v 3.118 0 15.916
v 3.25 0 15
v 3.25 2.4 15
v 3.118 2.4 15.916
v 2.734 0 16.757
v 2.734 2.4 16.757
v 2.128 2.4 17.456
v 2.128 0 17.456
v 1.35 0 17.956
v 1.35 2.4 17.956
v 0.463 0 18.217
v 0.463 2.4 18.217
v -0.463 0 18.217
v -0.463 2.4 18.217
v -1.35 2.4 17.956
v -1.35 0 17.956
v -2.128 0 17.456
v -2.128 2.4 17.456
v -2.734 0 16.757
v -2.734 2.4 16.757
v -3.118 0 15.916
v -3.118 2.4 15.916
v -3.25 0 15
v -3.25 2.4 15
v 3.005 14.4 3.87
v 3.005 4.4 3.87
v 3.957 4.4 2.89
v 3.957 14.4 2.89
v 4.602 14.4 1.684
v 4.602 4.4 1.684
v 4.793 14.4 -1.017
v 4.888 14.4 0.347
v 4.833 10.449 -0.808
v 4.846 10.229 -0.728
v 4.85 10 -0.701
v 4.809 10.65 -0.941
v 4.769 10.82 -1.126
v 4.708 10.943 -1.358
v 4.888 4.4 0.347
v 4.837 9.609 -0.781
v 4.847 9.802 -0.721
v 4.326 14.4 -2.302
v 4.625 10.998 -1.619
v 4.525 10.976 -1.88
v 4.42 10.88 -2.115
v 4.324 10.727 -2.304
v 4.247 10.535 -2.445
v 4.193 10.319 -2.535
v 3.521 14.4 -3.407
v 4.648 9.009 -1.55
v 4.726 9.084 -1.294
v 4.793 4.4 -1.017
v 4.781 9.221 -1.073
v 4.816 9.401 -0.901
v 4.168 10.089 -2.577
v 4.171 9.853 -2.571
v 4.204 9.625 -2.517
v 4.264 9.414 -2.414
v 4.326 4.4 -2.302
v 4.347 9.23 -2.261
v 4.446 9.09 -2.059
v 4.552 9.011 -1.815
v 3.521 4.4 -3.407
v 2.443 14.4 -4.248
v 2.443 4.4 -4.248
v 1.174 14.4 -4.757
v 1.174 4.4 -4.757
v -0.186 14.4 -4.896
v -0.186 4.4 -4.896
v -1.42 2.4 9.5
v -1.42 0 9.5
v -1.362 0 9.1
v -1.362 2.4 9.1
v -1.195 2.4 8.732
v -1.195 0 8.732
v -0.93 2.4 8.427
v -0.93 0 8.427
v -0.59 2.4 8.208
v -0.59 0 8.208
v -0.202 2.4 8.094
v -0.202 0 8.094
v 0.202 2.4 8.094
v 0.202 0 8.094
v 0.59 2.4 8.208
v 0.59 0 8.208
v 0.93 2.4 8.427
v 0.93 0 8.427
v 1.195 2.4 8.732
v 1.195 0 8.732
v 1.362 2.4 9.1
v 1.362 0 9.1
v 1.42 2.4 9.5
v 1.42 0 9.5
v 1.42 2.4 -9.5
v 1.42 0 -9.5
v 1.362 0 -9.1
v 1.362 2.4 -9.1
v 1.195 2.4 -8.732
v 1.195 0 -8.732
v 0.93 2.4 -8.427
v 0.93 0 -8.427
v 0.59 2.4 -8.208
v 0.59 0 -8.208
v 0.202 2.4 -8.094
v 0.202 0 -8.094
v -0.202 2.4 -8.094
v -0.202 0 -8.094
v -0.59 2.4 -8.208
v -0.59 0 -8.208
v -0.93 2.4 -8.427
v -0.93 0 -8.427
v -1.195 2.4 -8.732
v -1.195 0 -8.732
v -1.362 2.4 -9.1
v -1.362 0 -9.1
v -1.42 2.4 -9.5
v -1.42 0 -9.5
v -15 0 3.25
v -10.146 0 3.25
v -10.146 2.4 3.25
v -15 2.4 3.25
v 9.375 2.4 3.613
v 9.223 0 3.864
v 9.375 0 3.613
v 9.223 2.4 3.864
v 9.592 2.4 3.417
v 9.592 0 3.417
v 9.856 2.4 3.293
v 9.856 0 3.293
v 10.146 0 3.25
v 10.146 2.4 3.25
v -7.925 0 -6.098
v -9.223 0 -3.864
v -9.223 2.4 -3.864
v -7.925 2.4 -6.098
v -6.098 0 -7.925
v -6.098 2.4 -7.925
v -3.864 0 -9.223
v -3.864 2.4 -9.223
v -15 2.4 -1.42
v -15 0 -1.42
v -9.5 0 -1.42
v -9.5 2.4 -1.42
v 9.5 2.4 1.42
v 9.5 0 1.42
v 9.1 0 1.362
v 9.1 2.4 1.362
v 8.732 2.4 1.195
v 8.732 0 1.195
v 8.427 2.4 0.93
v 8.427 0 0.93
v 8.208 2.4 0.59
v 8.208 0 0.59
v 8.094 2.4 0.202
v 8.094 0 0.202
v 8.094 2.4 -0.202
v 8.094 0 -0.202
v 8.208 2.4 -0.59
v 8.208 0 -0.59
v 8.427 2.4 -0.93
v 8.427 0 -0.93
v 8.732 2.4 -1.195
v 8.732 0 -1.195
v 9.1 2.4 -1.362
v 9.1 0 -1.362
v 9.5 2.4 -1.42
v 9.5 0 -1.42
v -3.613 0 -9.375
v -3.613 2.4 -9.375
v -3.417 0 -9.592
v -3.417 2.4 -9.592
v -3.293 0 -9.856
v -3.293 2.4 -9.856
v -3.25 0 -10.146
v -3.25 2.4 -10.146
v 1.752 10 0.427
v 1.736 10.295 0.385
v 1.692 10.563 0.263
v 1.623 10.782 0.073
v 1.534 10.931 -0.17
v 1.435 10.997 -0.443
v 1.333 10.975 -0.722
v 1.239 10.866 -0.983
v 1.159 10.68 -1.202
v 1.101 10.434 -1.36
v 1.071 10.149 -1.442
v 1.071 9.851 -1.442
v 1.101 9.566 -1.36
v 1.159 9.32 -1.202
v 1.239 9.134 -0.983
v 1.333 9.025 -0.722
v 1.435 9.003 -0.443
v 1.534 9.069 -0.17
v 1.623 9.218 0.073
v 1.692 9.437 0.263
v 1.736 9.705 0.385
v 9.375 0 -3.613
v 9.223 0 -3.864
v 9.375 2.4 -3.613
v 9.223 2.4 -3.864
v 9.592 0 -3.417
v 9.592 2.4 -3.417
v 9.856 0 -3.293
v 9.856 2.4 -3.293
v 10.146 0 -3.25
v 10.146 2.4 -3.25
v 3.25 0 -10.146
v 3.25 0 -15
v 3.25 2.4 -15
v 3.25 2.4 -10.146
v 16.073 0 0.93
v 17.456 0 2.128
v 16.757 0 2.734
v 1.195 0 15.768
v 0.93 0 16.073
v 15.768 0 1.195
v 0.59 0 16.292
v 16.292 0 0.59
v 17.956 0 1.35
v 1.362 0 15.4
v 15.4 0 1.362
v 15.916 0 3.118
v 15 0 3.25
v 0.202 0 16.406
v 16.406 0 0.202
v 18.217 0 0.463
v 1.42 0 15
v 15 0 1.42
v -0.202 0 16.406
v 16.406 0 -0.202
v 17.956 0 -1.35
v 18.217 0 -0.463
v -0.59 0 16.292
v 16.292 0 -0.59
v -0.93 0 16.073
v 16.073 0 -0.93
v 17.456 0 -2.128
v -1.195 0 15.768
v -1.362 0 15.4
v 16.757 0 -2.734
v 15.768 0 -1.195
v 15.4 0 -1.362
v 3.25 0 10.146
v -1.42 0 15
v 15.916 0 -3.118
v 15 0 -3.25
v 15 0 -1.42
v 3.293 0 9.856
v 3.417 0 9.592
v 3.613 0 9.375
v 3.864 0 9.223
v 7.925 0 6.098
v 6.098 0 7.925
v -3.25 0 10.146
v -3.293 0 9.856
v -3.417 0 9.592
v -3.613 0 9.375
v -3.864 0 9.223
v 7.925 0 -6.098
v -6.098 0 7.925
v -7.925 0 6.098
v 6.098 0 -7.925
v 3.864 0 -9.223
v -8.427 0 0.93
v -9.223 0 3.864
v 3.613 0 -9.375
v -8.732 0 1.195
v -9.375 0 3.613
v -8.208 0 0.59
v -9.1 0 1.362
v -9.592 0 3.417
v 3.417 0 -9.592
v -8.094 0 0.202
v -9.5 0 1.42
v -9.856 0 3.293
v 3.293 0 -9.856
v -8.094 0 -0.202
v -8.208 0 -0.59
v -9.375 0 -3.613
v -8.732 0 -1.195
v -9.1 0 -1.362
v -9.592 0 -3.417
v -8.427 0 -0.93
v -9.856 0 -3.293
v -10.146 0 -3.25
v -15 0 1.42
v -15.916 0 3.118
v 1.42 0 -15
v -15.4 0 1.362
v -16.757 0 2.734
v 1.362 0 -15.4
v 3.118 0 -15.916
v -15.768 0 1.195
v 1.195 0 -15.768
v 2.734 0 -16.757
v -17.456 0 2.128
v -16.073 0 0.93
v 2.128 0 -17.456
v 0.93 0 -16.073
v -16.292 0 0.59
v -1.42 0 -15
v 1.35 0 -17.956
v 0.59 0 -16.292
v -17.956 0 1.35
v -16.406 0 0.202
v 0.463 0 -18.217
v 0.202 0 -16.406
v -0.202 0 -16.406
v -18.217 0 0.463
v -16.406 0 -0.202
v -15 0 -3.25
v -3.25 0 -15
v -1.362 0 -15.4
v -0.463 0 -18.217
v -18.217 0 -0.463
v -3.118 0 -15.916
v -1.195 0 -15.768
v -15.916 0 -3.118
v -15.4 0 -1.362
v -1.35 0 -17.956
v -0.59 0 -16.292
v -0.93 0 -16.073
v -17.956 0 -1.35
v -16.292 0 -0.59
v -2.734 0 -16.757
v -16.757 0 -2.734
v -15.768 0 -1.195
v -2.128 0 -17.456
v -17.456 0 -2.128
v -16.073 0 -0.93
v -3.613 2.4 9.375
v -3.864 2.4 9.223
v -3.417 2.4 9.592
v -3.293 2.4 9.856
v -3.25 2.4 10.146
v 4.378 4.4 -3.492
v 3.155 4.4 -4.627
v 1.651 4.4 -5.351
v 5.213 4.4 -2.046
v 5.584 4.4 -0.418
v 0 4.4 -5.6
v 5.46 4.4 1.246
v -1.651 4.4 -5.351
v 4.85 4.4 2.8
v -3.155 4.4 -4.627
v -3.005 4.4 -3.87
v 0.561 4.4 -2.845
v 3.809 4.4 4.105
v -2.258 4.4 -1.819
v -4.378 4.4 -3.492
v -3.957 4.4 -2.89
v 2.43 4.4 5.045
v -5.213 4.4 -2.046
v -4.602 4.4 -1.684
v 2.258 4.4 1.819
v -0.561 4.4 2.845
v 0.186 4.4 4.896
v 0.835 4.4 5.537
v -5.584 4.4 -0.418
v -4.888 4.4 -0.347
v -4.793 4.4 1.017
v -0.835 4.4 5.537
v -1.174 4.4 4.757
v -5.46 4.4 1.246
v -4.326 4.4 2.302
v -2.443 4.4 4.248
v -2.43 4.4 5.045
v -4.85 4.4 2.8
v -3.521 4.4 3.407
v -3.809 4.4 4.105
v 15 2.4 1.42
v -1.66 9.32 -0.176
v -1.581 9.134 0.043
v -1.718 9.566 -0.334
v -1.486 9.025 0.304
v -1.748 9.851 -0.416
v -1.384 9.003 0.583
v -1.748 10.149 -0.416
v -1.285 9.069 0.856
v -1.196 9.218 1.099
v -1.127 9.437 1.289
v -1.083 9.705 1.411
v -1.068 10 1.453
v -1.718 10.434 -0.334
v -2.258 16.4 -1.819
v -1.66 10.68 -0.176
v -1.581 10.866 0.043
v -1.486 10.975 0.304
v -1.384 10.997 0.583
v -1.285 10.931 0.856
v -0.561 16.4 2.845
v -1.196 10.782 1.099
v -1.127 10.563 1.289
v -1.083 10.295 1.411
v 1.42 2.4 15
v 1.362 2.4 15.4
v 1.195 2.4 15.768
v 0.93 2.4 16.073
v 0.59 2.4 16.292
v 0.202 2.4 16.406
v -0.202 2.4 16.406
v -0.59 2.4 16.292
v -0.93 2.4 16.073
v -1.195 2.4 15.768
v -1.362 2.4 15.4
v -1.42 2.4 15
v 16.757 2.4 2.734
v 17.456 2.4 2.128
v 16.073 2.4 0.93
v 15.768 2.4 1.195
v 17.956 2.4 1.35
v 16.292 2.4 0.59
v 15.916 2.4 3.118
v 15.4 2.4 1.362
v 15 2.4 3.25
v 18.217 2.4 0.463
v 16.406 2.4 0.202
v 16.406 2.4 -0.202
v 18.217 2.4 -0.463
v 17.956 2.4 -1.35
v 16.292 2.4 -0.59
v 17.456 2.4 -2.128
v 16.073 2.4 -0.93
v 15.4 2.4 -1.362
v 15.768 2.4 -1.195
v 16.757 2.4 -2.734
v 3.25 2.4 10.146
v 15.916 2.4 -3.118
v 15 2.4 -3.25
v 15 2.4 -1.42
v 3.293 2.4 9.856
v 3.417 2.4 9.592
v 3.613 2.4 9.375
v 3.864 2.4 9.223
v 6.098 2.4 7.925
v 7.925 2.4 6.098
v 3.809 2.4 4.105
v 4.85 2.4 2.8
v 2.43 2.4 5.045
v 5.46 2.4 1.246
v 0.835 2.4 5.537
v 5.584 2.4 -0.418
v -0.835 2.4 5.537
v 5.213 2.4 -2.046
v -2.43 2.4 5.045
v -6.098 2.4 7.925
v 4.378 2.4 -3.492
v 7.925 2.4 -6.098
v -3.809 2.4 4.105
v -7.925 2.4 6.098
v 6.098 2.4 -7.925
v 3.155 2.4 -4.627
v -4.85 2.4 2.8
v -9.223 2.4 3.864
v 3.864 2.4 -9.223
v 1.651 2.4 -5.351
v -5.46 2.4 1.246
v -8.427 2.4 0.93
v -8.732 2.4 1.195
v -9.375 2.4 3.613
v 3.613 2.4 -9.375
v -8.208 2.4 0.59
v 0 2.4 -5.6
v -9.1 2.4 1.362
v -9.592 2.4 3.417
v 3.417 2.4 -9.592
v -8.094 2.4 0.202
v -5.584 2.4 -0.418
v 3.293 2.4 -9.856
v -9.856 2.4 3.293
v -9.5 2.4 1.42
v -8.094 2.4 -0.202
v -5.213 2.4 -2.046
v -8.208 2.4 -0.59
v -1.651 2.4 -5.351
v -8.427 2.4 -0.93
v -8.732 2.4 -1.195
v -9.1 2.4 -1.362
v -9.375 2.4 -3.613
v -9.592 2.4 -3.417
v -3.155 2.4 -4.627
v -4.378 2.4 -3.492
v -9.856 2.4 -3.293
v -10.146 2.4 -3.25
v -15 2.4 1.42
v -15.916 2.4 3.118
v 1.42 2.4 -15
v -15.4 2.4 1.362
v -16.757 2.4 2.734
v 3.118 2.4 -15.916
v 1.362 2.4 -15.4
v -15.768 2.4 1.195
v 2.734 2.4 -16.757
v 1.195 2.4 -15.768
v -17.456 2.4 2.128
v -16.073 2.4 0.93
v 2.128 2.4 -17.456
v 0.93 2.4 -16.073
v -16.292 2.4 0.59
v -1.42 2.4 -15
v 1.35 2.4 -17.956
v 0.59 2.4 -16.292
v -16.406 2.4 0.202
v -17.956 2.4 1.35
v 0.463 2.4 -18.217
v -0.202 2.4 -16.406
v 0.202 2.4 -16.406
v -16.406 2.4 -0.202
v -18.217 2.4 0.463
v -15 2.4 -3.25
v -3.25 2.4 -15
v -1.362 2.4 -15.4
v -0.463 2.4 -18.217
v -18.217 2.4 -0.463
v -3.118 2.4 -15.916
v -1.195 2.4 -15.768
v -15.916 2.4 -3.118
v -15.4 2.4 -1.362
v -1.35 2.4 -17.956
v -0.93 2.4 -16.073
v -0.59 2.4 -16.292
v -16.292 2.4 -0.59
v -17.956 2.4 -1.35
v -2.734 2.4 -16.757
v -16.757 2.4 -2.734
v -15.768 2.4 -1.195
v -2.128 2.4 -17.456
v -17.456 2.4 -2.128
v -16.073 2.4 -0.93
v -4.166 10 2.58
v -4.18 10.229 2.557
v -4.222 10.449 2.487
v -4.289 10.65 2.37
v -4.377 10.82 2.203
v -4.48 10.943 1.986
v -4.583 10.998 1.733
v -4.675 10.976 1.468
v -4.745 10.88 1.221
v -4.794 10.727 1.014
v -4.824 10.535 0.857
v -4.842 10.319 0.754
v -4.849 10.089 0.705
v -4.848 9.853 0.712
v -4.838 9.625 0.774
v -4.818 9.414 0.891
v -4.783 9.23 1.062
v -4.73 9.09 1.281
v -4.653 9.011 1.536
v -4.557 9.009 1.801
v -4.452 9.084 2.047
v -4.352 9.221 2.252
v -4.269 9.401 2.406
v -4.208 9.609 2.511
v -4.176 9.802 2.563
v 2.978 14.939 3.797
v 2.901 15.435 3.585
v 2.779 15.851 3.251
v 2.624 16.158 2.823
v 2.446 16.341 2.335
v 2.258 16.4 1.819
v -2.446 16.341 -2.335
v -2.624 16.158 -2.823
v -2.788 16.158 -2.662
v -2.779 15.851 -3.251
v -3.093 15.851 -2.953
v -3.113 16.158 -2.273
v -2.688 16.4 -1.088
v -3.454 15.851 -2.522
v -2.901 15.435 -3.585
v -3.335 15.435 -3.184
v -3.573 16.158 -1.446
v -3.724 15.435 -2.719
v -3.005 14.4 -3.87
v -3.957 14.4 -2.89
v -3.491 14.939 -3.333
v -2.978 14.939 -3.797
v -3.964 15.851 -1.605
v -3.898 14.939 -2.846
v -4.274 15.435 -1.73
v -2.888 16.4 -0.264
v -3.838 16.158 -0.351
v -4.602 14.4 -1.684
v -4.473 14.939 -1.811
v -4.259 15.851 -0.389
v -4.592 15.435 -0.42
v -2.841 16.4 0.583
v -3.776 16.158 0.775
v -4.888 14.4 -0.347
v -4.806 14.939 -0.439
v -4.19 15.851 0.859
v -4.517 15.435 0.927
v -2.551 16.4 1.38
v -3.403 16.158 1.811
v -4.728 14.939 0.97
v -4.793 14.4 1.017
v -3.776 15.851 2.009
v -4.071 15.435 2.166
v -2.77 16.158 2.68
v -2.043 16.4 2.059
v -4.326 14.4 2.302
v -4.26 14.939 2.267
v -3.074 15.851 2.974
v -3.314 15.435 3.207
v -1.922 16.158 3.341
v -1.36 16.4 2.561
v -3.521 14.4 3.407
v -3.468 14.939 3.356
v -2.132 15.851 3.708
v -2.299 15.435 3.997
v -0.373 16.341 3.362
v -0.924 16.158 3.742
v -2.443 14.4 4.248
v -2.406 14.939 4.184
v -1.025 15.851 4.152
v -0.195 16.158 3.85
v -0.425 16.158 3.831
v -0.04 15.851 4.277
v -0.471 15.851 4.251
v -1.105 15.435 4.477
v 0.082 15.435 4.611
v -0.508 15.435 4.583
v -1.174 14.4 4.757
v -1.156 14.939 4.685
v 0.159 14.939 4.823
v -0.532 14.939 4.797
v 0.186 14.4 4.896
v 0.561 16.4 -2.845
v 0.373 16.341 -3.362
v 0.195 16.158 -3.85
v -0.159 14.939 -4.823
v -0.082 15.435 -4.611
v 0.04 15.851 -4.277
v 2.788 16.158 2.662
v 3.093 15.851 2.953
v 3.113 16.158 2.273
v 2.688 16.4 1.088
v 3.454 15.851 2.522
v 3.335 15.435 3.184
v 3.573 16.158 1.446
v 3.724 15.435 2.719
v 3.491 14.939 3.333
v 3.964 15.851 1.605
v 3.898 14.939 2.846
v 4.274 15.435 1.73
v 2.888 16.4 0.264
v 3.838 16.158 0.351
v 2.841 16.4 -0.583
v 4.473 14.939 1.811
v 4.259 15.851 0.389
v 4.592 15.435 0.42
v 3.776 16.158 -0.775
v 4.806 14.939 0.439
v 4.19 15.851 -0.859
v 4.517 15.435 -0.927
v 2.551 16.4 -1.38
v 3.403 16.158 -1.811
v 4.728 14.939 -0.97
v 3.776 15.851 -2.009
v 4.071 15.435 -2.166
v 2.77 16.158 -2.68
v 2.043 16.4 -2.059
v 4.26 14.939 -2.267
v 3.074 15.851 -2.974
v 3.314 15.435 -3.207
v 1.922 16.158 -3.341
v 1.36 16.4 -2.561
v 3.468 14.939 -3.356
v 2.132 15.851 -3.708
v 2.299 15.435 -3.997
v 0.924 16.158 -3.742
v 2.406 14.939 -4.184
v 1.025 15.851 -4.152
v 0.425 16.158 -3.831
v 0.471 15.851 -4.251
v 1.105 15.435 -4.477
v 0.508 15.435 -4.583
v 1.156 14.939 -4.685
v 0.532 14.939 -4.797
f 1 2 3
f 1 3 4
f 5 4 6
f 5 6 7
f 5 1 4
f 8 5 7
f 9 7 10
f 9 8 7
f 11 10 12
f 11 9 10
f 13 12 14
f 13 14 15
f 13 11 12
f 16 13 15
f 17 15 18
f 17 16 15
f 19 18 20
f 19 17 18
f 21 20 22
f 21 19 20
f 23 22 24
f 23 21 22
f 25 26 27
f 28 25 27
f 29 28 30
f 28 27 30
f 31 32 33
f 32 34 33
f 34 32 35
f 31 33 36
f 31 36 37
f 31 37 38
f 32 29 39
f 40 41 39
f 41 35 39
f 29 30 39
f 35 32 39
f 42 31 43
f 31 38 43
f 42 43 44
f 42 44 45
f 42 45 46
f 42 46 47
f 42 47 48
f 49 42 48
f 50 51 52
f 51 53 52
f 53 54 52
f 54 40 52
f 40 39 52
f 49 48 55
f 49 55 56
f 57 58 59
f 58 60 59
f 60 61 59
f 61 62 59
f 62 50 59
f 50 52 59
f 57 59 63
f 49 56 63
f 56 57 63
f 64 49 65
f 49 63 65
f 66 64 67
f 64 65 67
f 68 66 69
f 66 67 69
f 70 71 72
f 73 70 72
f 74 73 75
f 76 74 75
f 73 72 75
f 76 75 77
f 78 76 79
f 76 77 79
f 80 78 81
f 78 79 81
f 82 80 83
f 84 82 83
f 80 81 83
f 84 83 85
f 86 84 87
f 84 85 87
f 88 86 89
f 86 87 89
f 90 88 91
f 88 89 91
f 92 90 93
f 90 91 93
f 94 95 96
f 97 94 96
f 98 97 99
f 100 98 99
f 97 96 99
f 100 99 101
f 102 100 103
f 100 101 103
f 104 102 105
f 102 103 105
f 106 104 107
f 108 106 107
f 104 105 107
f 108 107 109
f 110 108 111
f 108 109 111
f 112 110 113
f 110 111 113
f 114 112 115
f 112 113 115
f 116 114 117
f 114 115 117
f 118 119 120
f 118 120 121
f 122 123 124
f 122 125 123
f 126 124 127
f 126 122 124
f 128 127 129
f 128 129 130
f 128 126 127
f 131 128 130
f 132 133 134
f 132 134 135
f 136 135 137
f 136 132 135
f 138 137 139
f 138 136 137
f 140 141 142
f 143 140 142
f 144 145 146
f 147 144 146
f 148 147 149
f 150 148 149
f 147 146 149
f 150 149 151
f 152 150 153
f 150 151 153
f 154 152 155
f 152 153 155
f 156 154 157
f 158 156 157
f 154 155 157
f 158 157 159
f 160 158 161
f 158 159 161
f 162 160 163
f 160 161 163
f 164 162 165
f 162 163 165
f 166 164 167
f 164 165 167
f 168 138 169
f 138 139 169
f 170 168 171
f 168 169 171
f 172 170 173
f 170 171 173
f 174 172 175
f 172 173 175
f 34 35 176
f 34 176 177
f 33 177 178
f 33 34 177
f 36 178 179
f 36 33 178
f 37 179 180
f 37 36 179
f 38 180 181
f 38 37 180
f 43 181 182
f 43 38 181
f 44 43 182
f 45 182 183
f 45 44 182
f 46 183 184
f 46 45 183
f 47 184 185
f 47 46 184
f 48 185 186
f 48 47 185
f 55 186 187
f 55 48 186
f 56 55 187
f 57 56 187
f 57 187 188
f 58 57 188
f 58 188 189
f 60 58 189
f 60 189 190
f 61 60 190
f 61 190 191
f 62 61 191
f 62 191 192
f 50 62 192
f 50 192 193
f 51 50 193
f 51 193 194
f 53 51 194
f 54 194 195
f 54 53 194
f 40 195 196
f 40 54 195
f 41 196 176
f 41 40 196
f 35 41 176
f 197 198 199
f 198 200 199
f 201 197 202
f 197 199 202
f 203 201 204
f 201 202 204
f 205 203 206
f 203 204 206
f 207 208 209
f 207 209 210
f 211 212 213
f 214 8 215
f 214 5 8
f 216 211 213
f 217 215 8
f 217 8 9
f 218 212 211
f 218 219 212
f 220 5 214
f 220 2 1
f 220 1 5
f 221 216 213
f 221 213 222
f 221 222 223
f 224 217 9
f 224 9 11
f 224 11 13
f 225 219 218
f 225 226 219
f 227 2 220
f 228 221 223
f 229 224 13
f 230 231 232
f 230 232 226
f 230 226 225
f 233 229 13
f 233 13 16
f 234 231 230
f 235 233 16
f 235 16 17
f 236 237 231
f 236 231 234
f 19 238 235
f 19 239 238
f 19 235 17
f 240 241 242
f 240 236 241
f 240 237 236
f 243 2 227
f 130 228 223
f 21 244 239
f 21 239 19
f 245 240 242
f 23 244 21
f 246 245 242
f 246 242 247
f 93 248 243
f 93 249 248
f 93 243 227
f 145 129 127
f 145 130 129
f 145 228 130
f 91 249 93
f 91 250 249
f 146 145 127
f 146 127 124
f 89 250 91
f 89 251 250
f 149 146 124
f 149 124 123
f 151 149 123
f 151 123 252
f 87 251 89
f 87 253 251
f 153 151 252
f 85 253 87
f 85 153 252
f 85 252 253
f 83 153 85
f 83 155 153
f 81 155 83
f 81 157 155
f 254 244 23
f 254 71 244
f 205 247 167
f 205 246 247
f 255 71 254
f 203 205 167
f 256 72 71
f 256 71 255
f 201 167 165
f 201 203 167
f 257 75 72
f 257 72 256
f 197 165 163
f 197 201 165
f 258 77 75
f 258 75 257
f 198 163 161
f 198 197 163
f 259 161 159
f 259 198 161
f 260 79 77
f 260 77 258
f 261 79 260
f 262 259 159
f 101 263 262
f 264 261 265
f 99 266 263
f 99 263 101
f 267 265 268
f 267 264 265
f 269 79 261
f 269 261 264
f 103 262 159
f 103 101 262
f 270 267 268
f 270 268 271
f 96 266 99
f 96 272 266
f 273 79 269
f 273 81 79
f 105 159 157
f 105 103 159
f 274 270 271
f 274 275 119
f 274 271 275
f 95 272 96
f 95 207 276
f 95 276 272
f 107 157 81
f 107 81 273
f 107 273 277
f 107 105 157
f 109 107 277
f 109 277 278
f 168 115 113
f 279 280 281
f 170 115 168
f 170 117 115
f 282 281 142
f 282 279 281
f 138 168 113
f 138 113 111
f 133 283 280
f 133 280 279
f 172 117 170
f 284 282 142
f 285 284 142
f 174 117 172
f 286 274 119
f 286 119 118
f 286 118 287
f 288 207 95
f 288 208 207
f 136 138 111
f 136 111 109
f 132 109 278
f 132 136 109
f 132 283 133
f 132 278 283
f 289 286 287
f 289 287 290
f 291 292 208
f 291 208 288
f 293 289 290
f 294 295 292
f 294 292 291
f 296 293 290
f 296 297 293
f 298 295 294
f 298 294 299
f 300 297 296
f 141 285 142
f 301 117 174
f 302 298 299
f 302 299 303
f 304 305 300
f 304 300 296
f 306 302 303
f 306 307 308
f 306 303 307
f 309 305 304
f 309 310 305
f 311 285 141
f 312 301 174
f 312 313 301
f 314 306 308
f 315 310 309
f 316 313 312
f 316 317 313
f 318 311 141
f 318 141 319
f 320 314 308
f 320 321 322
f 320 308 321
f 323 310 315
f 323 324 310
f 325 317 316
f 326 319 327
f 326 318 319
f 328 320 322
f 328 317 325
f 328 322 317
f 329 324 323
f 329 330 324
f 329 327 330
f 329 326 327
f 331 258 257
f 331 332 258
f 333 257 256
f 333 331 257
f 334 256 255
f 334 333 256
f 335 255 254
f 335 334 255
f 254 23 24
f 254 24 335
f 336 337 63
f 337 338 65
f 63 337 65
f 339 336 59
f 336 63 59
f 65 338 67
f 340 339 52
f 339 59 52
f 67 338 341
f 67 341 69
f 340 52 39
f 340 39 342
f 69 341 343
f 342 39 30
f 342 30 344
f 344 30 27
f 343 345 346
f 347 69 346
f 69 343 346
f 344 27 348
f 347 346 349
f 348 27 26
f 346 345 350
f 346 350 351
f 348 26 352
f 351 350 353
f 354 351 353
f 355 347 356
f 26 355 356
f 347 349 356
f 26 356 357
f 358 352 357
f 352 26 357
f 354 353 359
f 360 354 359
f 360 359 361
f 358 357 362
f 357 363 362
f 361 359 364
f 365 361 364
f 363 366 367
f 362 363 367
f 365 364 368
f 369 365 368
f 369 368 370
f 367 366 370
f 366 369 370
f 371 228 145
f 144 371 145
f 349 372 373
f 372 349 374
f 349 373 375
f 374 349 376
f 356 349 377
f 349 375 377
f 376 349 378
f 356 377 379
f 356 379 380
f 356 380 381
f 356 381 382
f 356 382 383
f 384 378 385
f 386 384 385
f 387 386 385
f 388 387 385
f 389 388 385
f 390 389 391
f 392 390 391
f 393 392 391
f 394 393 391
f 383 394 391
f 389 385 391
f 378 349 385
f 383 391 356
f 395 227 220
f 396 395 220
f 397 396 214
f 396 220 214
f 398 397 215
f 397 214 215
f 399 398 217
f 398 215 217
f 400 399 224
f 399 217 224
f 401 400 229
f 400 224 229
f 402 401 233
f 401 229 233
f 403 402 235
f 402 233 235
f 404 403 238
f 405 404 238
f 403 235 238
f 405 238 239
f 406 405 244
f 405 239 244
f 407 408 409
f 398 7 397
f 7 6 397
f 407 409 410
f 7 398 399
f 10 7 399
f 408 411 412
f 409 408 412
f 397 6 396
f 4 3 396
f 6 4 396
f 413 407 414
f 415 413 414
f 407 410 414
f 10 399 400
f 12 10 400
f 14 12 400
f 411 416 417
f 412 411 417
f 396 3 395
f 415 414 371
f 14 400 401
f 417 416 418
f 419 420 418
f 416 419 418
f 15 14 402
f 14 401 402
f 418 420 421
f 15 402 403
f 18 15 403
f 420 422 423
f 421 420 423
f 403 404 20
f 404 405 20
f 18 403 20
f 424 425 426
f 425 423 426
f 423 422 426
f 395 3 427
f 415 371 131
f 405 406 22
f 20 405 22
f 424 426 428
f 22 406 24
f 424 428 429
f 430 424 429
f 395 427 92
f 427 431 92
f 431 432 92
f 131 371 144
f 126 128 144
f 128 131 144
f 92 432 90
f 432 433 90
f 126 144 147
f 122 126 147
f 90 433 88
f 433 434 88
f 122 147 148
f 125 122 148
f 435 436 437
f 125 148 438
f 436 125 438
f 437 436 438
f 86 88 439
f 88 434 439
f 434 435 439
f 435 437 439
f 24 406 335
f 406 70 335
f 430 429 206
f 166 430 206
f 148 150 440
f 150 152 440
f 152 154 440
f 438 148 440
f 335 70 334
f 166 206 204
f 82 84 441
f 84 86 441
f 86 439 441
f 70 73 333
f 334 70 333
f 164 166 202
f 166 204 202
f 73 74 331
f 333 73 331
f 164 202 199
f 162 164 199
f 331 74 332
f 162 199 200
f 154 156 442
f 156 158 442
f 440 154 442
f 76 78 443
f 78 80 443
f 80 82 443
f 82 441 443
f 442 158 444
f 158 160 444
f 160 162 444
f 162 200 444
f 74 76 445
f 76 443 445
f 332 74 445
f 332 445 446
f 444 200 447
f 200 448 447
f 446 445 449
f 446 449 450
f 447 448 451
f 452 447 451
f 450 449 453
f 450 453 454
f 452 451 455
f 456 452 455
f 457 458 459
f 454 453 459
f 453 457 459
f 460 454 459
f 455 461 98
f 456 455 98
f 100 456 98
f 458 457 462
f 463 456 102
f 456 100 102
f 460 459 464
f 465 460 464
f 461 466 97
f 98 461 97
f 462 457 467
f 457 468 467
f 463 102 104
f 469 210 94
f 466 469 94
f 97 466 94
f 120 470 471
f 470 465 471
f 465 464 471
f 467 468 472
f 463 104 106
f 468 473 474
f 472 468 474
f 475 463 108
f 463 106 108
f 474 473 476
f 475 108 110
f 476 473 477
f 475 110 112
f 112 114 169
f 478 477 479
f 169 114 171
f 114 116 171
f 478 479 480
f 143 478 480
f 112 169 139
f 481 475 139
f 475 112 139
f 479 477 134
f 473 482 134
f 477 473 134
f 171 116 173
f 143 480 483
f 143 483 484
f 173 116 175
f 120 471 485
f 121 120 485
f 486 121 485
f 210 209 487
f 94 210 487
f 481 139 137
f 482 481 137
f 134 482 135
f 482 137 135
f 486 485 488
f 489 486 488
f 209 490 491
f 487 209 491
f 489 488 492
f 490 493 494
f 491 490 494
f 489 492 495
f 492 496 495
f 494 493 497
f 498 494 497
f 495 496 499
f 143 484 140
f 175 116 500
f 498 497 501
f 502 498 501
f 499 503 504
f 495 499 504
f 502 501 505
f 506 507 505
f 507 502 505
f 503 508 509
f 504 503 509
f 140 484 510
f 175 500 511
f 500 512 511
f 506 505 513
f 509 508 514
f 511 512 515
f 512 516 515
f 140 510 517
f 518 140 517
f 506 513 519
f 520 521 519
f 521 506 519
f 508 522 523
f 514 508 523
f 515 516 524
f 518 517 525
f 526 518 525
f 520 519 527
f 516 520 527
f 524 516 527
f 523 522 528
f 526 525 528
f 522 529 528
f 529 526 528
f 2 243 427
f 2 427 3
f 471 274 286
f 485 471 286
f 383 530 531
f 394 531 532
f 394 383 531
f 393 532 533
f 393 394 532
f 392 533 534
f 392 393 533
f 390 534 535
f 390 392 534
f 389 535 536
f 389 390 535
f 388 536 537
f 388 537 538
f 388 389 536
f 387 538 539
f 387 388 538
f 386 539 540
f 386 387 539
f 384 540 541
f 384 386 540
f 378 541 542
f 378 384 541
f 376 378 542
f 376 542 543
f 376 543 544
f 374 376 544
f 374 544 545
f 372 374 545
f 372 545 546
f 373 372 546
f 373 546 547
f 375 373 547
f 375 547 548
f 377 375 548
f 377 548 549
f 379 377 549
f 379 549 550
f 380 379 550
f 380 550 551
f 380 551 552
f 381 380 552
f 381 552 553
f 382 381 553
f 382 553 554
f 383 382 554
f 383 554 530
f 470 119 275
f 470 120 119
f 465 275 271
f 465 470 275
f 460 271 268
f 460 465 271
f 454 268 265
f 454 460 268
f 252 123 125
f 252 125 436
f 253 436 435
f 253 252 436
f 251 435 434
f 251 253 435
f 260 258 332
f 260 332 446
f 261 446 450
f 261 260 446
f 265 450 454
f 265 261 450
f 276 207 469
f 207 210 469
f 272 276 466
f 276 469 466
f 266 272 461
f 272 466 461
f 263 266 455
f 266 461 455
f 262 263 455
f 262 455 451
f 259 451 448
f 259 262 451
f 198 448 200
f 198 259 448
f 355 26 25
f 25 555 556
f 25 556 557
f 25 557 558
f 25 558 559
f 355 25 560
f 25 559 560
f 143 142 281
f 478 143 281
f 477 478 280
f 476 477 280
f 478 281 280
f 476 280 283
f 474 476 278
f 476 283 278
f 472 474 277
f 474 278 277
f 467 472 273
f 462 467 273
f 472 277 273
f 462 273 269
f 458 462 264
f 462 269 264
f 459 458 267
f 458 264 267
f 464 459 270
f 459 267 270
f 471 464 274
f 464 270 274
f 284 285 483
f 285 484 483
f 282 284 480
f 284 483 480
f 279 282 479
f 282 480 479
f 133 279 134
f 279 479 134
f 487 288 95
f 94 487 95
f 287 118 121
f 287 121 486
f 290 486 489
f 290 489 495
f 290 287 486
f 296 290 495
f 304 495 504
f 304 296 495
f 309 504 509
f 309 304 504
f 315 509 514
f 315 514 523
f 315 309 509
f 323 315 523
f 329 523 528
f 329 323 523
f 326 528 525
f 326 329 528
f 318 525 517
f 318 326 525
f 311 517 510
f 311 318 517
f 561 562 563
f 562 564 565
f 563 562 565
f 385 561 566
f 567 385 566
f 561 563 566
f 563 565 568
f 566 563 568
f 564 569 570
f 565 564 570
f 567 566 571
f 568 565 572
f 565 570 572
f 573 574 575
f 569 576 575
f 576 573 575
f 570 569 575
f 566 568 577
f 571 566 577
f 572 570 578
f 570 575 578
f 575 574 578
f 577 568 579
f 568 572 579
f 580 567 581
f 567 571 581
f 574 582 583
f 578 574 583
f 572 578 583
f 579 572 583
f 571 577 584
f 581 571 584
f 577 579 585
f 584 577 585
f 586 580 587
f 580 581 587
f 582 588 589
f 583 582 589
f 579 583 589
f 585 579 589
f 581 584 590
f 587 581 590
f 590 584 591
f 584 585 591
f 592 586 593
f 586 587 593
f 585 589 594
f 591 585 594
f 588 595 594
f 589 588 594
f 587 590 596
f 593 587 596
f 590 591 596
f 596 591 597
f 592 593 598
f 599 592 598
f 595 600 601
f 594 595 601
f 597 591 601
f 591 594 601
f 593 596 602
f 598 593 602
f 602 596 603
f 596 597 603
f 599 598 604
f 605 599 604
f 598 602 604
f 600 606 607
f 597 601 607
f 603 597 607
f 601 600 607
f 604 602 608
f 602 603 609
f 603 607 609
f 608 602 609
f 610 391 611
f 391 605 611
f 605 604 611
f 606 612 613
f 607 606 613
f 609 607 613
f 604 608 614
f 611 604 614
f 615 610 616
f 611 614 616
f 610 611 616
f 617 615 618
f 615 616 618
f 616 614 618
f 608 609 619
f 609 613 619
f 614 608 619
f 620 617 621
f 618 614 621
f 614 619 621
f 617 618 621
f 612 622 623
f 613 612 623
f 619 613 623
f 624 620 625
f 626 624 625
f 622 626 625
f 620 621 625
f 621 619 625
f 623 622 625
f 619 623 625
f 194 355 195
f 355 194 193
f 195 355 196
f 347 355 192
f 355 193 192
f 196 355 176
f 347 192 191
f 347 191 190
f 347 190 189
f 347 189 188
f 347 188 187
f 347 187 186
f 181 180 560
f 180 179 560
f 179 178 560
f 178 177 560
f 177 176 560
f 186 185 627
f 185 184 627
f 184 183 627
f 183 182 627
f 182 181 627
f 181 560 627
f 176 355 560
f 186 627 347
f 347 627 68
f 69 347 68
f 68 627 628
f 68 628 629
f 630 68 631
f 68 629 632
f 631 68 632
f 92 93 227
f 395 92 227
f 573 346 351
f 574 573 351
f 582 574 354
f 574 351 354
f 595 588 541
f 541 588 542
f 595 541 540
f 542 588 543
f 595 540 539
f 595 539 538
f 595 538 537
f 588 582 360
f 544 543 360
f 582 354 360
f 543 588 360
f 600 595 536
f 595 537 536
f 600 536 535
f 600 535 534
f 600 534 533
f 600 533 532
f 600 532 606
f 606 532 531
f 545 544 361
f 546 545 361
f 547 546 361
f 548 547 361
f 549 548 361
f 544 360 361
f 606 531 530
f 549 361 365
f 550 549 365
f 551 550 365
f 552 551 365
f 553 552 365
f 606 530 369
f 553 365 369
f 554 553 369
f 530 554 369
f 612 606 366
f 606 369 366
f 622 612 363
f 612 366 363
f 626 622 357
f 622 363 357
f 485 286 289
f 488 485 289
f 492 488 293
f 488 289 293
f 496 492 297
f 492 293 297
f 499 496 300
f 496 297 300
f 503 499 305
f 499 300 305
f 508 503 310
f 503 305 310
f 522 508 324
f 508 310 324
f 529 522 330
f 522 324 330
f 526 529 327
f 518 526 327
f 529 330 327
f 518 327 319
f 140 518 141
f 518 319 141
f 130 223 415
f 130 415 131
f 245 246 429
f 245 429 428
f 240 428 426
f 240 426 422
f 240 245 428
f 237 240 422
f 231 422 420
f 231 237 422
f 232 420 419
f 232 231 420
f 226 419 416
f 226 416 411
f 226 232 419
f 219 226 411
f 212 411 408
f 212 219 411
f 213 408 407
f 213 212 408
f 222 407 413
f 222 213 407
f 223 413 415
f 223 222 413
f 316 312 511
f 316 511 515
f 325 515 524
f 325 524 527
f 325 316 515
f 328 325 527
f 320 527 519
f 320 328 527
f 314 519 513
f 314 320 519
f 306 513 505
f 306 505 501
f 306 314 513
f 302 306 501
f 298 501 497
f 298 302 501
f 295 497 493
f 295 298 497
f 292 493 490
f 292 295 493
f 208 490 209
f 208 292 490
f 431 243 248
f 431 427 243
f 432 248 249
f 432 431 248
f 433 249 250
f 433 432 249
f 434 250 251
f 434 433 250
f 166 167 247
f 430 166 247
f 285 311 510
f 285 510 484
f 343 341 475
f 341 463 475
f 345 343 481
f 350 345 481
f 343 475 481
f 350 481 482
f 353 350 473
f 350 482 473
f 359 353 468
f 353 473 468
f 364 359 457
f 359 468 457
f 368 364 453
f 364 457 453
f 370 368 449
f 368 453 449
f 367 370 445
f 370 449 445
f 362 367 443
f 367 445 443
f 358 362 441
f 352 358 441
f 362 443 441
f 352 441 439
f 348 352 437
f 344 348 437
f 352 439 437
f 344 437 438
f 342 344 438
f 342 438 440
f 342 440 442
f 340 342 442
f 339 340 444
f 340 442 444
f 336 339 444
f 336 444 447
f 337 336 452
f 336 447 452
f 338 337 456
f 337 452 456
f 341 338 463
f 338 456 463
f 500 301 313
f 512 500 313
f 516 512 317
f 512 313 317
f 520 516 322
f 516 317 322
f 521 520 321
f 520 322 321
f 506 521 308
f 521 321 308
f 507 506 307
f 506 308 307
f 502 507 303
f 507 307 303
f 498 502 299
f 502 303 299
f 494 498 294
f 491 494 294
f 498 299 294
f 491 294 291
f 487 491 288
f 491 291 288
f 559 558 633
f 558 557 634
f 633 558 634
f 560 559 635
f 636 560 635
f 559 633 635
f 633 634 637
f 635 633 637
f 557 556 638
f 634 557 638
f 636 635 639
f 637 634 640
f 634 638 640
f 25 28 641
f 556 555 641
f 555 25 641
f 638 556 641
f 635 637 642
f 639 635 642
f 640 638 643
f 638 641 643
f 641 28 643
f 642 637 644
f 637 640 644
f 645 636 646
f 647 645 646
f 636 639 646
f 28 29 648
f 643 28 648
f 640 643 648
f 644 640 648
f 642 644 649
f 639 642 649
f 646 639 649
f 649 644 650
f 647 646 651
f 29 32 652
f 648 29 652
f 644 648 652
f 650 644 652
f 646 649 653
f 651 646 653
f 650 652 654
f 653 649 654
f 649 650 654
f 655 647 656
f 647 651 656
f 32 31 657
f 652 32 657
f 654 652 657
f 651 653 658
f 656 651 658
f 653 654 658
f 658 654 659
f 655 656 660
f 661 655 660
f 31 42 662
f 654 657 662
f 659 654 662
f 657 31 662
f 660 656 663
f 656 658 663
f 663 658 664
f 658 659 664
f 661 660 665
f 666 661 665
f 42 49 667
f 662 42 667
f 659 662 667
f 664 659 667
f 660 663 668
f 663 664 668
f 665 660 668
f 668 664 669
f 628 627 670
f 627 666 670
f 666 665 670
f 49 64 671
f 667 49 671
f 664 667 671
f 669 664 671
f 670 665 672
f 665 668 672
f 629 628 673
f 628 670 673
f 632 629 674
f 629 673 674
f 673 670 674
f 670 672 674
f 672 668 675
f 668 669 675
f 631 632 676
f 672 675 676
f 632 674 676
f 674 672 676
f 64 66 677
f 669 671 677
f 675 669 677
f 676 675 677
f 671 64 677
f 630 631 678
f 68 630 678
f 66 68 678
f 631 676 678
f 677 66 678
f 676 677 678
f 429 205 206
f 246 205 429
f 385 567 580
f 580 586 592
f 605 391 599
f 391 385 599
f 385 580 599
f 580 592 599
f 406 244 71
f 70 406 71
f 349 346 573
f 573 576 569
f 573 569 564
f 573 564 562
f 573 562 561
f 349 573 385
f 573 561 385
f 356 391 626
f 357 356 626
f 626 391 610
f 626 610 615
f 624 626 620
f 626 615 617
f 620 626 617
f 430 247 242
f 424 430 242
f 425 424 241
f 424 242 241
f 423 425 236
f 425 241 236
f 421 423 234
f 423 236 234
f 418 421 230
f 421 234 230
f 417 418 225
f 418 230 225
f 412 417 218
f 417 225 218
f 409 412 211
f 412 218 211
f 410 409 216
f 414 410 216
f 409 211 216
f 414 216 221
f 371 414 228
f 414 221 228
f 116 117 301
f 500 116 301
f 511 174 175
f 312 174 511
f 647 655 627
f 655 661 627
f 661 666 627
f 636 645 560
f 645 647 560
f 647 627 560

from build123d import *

# Parameters (mm, degrees)
BOSS_EXTRUDE1_DEPTH     = 2.4
FILLET1_R               = 1
CUT_EXTRUDE1_REACH      = 32.579
CUT_EXTRUDE2_DEPTH      = 32.741278757
CUT_EXTRUDE2_DEPTH_BACK = 32.741278757
SKETCH6_R               = 1


with BuildPart() as part:
    # Sketch1 → Boss-Extrude1 (new body)
    with BuildSketch(Plane(origin=(0, 0, 0), x_dir=(1, 0, 0), z_dir=(0, 1, 0))):
        with BuildLine():
            Line((-15, 3.25), (-9.45714016, 3.25))
            ThreePointArc((-9.45714016, 3.25), (-7.071067812, 7.071067812), (-3.25, 9.45714016))
            Line((-3.25, 9.45714016), (-3.25, 15))
            ThreePointArc((-3.25, 15), (0, 18.25), (3.25, 15))
            Line((3.25, 15), (3.25, 9.45714016))
            ThreePointArc((3.25, 9.45714016), (7.071067812, 7.071067812), (9.45714016, 3.25))
            Line((9.45714016, 3.25), (15, 3.25))
            ThreePointArc((15, 3.25), (18.25, 0), (15, -3.25))
            Line((15, -3.25), (9.45714016, -3.25))
            ThreePointArc((9.45714016, -3.25), (7.071067812, -7.071067812), (3.25, -9.45714016))
            Line((3.25, -9.45714016), (3.25, -15))
            ThreePointArc((3.25, -15), (0, -18.25), (-3.25, -15))
            Line((-3.25, -15), (-3.25, -9.45714016))
            ThreePointArc((-3.25, -9.45714016), (-7.071067812, -7.071067812), (-9.45714016, -3.25))
            Line((-9.45714016, -3.25), (-15, -3.25))
            ThreePointArc((-15, -3.25), (-18.25, 0), (-15, 3.25))
        make_face()
        with BuildLine():
            Line((-15, 1.42), (-9.5, 1.42))
            ThreePointArc((-9.5, 1.42), (-8.08, 0), (-9.5, -1.42))
            Line((-9.5, -1.42), (-15, -1.42))
            ThreePointArc((-15, -1.42), (-16.42, 0), (-15, 1.42))
        make_face(mode=Mode.SUBTRACT)
        with BuildLine():
            Line((1.42, 15), (1.42, 9.5))
            ThreePointArc((1.42, 9.5), (0, 8.08), (-1.42, 9.5))
            Line((-1.42, 9.5), (-1.42, 15))
            ThreePointArc((-1.42, 15), (0, 16.42), (1.42, 15))
        make_face(mode=Mode.SUBTRACT)
        with BuildLine():
            Line((15, -1.42), (9.5, -1.42))
            ThreePointArc((9.5, -1.42), (8.08, 0), (9.5, 1.42))
            Line((9.5, 1.42), (15, 1.42))
            ThreePointArc((15, 1.42), (16.42, 0), (15, -1.42))
        make_face(mode=Mode.SUBTRACT)
        with BuildLine():
            Line((-1.42, -15), (-1.42, -9.5))
            ThreePointArc((-1.42, -9.5), (0, -8.08), (1.42, -9.5))
            Line((1.42, -9.5), (1.42, -15))
            ThreePointArc((1.42, -15), (0, -16.42), (-1.42, -15))
        make_face(mode=Mode.SUBTRACT)
    extrude(amount=BOSS_EXTRUDE1_DEPTH)

    # Fillet1
    fillet1_edges = [part.edges().sort_by_distance(p)[0] for p in [
        (-9.45714016, 1.2, -3.25),
        (-3.25, 1.2, -9.45714016),
        (3.25, 1.2, -9.45714016),
        (9.45714016, 1.2, -3.25),
        (9.45714016, 1.2, 3.25),
        (3.25, 1.2, 9.45714016),
        (-3.25, 1.2, 9.45714016),
        (-9.45714016, 1.2, 3.25),
    ]]
    fillet(fillet1_edges, radius=FILLET1_R)

    # Sketch2 → Revolve2 (revolve)
    with BuildSketch(Plane.XY, mode=Mode.PRIVATE) as revolve2_sk:
        with BuildLine():
            Line((0, 4.4), (0, 16.4))
            Line((0, 16.4), (2.9, 16.4))
            ThreePointArc((2.9, 16.4), (4.314213562, 15.814213562), (4.9, 14.4))
            Line((4.9, 14.4), (4.9, 4.4))
            Line((4.9, 4.4), (5.6, 4.4))
            Line((5.6, 4.4), (5.6, 2.4))
            Line((5.6, 2.4), (0, 2.4))
            Line((0, 2.4), (0, 4.4))
        make_face()
    revolve(revolve2_sk.sketch.rotate(Axis((0, 4.4, 0), (0, 1, 0)), 90), axis=Axis((0, 4.4, 0), (0, 1, 0)))

    # Cut-Extrude1: up to this face of the body (flat: up to its plane)
    cut_extrude1_end = Plane(part.part.faces().sort_by_distance((0, 4.4, 5.058391919))[0])
    # Sketch5 → Cut-Extrude1 (cut, up to the picked face)
    with BuildSketch(Plane(origin=(0, 16.4, 0), x_dir=(1, 0, 0), z_dir=(0, 1, 0)), mode=Mode.PRIVATE) as cut_extrude1_sk1:
        with BuildLine():
            ThreePointArc((-0.560667259, -2.845285965), (0.991858416, -2.7251086), (2.258410603, -1.819225535))
            Line((2.258410603, -1.819225535), (0.560667259, 2.845285965))
            ThreePointArc((0.560667259, 2.845285965), (-0.991858416, 2.7251086), (-2.258410603, 1.819225535))
            Line((-2.258410603, 1.819225535), (-0.560667259, -2.845285965))
        make_face()
    cut_extrude1_tool1 = split(extrude(cut_extrude1_sk1.sketch, amount=-CUT_EXTRUDE1_REACH, mode=Mode.PRIVATE), bisect_by=cut_extrude1_end, keep=Keep.BOTH, mode=Mode.PRIVATE)
    # Sketch5 → Cut-Extrude1 (cut, up to the picked face)
    with BuildSketch(Plane(origin=(0, 16.4, 0), x_dir=(1, 0, 0), z_dir=(0, 1, 0)), mode=Mode.PRIVATE) as cut_extrude1_sk2:
        with BuildLine():
            ThreePointArc((0.185903471, -4.896472189), (1.675898702, -4.604493842), (3.004981333, -3.870411759))
            Line((3.004981333, -3.870411759), (2.258410603, -1.819225535))
            ThreePointArc((2.258410603, -1.819225535), (0.991858416, -2.7251086), (-0.560667259, -2.845285965))
            Line((-0.560667259, -2.845285965), (0.185903471, -4.896472189))
        make_face()
    cut_extrude1_tool2 = split(extrude(cut_extrude1_sk2.sketch, amount=-CUT_EXTRUDE1_REACH, mode=Mode.PRIVATE), bisect_by=cut_extrude1_end, keep=Keep.BOTH, mode=Mode.PRIVATE)
    # Sketch5 → Cut-Extrude1 (cut, up to the picked face)
    with BuildSketch(Plane(origin=(0, 16.4, 0), x_dir=(1, 0, 0), z_dir=(0, 1, 0)), mode=Mode.PRIVATE) as cut_extrude1_sk3:
        with BuildLine():
            ThreePointArc((-2.258410603, 1.819225535), (-0.991858416, 2.7251086), (0.560667259, 2.845285965))
            Line((0.560667259, 2.845285965), (-0.185903471, 4.896472189))
            ThreePointArc((-0.185903471, 4.896472189), (-1.675898702, 4.604493842), (-3.004981333, 3.870411759))
            Line((-3.004981333, 3.870411759), (-2.258410603, 1.819225535))
        make_face()
    cut_extrude1_tool3 = split(extrude(cut_extrude1_sk3.sketch, amount=-CUT_EXTRUDE1_REACH, mode=Mode.PRIVATE), bisect_by=cut_extrude1_end, keep=Keep.BOTH, mode=Mode.PRIVATE)
    add(cut_extrude1_tool1.solids().sort_by(Axis((0, 16.4, 0), (0, -1, 0)))[0], mode=Mode.SUBTRACT)
    add(cut_extrude1_tool2.solids().sort_by(Axis((1.296647, 16.4, 3.562508), (0, -1, 0)))[0], mode=Mode.SUBTRACT)
    add(cut_extrude1_tool3.solids().sort_by(Axis((-1.296647, 16.4, -3.562508), (0, -1, 0)))[0], mode=Mode.SUBTRACT)

    # Sketch6 → Cut-Extrude2 (cut, two sides: drawn at the far end of the back side and taken through both)
    with BuildSketch(Plane(origin=(1.409538931, 0, -0.513030215), x_dir=(0.3420201433256665, 0, 0.9396926207859093), z_dir=(-0.9396926207859092, 0, 0.34202014332566644)).offset(-CUT_EXTRUDE2_DEPTH_BACK)):
        with Locations((0, 10)):
            Circle(SKETCH6_R)
    extrude(amount=CUT_EXTRUDE2_DEPTH + CUT_EXTRUDE2_DEPTH_BACK, mode=Mode.SUBTRACT)


solid = part.part
